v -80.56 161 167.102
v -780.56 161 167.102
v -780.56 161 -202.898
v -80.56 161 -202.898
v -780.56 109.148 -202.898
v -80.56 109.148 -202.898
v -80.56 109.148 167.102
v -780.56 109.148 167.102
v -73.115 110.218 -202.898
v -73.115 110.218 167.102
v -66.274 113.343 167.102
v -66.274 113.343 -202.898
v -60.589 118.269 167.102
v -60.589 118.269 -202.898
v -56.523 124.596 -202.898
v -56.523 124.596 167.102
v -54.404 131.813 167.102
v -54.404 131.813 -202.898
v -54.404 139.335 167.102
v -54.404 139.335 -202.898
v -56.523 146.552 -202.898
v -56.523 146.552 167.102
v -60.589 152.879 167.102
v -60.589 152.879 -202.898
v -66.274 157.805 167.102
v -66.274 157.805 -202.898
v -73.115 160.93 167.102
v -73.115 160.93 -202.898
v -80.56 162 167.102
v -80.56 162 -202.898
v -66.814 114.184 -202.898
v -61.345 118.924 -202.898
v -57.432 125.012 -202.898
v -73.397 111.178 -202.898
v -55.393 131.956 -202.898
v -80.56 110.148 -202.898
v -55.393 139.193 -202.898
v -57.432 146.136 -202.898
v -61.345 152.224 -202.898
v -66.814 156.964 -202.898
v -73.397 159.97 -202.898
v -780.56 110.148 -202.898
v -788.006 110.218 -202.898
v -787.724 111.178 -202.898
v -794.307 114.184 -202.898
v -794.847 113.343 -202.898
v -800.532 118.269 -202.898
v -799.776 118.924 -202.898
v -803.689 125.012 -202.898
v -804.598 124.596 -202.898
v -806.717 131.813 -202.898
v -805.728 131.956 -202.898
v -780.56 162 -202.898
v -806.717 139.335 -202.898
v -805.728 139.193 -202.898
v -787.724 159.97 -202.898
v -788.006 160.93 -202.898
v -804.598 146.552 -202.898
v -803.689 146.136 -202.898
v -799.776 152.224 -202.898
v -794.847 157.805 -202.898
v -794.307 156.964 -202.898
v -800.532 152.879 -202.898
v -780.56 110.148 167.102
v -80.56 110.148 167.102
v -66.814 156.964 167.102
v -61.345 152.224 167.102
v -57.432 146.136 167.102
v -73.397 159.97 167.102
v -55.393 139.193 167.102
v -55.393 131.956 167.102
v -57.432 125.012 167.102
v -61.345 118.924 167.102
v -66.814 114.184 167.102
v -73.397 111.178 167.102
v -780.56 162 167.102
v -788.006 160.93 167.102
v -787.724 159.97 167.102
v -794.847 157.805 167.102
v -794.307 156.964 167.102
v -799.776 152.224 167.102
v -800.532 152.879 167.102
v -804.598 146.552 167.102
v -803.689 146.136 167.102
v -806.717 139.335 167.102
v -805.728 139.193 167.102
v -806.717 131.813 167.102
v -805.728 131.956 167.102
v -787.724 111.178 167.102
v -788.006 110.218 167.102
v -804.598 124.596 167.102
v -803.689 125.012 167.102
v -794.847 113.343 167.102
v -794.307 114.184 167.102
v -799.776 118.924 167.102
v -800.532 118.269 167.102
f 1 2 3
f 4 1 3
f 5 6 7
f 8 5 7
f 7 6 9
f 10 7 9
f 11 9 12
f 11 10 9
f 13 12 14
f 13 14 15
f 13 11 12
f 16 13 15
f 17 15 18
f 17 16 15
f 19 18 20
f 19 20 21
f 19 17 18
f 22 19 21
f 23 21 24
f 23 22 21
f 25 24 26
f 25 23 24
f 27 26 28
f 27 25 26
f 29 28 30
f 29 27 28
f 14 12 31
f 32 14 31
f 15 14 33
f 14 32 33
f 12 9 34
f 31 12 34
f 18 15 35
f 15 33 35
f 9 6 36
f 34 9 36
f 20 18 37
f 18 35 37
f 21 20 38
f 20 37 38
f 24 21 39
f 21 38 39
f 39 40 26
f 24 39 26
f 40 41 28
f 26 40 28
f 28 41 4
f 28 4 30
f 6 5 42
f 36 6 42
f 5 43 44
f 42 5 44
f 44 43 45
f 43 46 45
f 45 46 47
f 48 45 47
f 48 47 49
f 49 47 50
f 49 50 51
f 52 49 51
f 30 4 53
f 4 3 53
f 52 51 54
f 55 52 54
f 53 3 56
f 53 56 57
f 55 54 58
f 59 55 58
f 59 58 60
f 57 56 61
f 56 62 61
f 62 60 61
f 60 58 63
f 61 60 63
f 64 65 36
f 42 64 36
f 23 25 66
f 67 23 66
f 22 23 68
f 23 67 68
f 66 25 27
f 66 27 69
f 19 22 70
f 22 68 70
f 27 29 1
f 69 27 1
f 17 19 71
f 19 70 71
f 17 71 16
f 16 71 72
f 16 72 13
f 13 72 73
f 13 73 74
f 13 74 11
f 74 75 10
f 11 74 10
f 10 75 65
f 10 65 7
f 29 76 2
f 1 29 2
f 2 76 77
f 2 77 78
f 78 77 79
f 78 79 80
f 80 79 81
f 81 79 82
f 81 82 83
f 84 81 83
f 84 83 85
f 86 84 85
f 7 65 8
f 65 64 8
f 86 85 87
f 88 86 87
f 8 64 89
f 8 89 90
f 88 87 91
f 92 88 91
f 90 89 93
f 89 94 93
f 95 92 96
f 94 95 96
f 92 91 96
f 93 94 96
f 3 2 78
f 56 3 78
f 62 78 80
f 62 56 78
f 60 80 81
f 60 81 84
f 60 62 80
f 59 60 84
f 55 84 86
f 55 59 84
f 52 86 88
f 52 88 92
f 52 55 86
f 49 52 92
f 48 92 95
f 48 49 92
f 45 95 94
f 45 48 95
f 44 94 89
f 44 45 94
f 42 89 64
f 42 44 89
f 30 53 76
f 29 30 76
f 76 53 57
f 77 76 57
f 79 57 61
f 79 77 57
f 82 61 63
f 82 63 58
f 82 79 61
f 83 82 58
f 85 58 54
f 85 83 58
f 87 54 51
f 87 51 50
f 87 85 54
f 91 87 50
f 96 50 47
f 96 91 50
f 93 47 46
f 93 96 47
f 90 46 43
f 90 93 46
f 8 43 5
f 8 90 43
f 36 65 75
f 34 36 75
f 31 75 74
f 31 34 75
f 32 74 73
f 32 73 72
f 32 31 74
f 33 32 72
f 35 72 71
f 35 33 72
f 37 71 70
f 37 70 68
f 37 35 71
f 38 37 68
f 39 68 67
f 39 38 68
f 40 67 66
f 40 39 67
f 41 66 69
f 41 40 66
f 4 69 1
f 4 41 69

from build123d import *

# Parameters (mm, degrees)
SKETCH_2_W = 370
SKETCH_2_H = 1


with BuildPart() as part:
    # 扫描1: sweep along a path in 草图1
    with BuildLine(Plane(origin=(0, 0, -202.897842698), x_dir=(-1, 0, 0), z_dir=(0, 0, -1))) as sweep_1_path:
        Line((80.56049666, 160.574025873), (780.56049666, 160.574025873))
        ThreePointArc((780.56049666, 160.574025873), (805.56049666, 135.574025873), (780.56049666, 110.574025873))
        Line((780.56049666, 110.574025873), (80.56049666, 110.574025873))
        ThreePointArc((80.56049666, 110.574025873), (55.56049666, 135.574025873), (80.56049666, 160.574025873))
    # 草图2 → 扫描1 (sweep)
    with BuildSketch(Plane(origin=(-80.56049666, 0, 0), x_dir=(0, 0, -1), z_dir=(1, 0, 0))):
        with Locations((17.897842698, 161.5)):
            Rectangle(SKETCH_2_W, SKETCH_2_H)
    sweep(path=sweep_1_path.line)


solid = part.part
